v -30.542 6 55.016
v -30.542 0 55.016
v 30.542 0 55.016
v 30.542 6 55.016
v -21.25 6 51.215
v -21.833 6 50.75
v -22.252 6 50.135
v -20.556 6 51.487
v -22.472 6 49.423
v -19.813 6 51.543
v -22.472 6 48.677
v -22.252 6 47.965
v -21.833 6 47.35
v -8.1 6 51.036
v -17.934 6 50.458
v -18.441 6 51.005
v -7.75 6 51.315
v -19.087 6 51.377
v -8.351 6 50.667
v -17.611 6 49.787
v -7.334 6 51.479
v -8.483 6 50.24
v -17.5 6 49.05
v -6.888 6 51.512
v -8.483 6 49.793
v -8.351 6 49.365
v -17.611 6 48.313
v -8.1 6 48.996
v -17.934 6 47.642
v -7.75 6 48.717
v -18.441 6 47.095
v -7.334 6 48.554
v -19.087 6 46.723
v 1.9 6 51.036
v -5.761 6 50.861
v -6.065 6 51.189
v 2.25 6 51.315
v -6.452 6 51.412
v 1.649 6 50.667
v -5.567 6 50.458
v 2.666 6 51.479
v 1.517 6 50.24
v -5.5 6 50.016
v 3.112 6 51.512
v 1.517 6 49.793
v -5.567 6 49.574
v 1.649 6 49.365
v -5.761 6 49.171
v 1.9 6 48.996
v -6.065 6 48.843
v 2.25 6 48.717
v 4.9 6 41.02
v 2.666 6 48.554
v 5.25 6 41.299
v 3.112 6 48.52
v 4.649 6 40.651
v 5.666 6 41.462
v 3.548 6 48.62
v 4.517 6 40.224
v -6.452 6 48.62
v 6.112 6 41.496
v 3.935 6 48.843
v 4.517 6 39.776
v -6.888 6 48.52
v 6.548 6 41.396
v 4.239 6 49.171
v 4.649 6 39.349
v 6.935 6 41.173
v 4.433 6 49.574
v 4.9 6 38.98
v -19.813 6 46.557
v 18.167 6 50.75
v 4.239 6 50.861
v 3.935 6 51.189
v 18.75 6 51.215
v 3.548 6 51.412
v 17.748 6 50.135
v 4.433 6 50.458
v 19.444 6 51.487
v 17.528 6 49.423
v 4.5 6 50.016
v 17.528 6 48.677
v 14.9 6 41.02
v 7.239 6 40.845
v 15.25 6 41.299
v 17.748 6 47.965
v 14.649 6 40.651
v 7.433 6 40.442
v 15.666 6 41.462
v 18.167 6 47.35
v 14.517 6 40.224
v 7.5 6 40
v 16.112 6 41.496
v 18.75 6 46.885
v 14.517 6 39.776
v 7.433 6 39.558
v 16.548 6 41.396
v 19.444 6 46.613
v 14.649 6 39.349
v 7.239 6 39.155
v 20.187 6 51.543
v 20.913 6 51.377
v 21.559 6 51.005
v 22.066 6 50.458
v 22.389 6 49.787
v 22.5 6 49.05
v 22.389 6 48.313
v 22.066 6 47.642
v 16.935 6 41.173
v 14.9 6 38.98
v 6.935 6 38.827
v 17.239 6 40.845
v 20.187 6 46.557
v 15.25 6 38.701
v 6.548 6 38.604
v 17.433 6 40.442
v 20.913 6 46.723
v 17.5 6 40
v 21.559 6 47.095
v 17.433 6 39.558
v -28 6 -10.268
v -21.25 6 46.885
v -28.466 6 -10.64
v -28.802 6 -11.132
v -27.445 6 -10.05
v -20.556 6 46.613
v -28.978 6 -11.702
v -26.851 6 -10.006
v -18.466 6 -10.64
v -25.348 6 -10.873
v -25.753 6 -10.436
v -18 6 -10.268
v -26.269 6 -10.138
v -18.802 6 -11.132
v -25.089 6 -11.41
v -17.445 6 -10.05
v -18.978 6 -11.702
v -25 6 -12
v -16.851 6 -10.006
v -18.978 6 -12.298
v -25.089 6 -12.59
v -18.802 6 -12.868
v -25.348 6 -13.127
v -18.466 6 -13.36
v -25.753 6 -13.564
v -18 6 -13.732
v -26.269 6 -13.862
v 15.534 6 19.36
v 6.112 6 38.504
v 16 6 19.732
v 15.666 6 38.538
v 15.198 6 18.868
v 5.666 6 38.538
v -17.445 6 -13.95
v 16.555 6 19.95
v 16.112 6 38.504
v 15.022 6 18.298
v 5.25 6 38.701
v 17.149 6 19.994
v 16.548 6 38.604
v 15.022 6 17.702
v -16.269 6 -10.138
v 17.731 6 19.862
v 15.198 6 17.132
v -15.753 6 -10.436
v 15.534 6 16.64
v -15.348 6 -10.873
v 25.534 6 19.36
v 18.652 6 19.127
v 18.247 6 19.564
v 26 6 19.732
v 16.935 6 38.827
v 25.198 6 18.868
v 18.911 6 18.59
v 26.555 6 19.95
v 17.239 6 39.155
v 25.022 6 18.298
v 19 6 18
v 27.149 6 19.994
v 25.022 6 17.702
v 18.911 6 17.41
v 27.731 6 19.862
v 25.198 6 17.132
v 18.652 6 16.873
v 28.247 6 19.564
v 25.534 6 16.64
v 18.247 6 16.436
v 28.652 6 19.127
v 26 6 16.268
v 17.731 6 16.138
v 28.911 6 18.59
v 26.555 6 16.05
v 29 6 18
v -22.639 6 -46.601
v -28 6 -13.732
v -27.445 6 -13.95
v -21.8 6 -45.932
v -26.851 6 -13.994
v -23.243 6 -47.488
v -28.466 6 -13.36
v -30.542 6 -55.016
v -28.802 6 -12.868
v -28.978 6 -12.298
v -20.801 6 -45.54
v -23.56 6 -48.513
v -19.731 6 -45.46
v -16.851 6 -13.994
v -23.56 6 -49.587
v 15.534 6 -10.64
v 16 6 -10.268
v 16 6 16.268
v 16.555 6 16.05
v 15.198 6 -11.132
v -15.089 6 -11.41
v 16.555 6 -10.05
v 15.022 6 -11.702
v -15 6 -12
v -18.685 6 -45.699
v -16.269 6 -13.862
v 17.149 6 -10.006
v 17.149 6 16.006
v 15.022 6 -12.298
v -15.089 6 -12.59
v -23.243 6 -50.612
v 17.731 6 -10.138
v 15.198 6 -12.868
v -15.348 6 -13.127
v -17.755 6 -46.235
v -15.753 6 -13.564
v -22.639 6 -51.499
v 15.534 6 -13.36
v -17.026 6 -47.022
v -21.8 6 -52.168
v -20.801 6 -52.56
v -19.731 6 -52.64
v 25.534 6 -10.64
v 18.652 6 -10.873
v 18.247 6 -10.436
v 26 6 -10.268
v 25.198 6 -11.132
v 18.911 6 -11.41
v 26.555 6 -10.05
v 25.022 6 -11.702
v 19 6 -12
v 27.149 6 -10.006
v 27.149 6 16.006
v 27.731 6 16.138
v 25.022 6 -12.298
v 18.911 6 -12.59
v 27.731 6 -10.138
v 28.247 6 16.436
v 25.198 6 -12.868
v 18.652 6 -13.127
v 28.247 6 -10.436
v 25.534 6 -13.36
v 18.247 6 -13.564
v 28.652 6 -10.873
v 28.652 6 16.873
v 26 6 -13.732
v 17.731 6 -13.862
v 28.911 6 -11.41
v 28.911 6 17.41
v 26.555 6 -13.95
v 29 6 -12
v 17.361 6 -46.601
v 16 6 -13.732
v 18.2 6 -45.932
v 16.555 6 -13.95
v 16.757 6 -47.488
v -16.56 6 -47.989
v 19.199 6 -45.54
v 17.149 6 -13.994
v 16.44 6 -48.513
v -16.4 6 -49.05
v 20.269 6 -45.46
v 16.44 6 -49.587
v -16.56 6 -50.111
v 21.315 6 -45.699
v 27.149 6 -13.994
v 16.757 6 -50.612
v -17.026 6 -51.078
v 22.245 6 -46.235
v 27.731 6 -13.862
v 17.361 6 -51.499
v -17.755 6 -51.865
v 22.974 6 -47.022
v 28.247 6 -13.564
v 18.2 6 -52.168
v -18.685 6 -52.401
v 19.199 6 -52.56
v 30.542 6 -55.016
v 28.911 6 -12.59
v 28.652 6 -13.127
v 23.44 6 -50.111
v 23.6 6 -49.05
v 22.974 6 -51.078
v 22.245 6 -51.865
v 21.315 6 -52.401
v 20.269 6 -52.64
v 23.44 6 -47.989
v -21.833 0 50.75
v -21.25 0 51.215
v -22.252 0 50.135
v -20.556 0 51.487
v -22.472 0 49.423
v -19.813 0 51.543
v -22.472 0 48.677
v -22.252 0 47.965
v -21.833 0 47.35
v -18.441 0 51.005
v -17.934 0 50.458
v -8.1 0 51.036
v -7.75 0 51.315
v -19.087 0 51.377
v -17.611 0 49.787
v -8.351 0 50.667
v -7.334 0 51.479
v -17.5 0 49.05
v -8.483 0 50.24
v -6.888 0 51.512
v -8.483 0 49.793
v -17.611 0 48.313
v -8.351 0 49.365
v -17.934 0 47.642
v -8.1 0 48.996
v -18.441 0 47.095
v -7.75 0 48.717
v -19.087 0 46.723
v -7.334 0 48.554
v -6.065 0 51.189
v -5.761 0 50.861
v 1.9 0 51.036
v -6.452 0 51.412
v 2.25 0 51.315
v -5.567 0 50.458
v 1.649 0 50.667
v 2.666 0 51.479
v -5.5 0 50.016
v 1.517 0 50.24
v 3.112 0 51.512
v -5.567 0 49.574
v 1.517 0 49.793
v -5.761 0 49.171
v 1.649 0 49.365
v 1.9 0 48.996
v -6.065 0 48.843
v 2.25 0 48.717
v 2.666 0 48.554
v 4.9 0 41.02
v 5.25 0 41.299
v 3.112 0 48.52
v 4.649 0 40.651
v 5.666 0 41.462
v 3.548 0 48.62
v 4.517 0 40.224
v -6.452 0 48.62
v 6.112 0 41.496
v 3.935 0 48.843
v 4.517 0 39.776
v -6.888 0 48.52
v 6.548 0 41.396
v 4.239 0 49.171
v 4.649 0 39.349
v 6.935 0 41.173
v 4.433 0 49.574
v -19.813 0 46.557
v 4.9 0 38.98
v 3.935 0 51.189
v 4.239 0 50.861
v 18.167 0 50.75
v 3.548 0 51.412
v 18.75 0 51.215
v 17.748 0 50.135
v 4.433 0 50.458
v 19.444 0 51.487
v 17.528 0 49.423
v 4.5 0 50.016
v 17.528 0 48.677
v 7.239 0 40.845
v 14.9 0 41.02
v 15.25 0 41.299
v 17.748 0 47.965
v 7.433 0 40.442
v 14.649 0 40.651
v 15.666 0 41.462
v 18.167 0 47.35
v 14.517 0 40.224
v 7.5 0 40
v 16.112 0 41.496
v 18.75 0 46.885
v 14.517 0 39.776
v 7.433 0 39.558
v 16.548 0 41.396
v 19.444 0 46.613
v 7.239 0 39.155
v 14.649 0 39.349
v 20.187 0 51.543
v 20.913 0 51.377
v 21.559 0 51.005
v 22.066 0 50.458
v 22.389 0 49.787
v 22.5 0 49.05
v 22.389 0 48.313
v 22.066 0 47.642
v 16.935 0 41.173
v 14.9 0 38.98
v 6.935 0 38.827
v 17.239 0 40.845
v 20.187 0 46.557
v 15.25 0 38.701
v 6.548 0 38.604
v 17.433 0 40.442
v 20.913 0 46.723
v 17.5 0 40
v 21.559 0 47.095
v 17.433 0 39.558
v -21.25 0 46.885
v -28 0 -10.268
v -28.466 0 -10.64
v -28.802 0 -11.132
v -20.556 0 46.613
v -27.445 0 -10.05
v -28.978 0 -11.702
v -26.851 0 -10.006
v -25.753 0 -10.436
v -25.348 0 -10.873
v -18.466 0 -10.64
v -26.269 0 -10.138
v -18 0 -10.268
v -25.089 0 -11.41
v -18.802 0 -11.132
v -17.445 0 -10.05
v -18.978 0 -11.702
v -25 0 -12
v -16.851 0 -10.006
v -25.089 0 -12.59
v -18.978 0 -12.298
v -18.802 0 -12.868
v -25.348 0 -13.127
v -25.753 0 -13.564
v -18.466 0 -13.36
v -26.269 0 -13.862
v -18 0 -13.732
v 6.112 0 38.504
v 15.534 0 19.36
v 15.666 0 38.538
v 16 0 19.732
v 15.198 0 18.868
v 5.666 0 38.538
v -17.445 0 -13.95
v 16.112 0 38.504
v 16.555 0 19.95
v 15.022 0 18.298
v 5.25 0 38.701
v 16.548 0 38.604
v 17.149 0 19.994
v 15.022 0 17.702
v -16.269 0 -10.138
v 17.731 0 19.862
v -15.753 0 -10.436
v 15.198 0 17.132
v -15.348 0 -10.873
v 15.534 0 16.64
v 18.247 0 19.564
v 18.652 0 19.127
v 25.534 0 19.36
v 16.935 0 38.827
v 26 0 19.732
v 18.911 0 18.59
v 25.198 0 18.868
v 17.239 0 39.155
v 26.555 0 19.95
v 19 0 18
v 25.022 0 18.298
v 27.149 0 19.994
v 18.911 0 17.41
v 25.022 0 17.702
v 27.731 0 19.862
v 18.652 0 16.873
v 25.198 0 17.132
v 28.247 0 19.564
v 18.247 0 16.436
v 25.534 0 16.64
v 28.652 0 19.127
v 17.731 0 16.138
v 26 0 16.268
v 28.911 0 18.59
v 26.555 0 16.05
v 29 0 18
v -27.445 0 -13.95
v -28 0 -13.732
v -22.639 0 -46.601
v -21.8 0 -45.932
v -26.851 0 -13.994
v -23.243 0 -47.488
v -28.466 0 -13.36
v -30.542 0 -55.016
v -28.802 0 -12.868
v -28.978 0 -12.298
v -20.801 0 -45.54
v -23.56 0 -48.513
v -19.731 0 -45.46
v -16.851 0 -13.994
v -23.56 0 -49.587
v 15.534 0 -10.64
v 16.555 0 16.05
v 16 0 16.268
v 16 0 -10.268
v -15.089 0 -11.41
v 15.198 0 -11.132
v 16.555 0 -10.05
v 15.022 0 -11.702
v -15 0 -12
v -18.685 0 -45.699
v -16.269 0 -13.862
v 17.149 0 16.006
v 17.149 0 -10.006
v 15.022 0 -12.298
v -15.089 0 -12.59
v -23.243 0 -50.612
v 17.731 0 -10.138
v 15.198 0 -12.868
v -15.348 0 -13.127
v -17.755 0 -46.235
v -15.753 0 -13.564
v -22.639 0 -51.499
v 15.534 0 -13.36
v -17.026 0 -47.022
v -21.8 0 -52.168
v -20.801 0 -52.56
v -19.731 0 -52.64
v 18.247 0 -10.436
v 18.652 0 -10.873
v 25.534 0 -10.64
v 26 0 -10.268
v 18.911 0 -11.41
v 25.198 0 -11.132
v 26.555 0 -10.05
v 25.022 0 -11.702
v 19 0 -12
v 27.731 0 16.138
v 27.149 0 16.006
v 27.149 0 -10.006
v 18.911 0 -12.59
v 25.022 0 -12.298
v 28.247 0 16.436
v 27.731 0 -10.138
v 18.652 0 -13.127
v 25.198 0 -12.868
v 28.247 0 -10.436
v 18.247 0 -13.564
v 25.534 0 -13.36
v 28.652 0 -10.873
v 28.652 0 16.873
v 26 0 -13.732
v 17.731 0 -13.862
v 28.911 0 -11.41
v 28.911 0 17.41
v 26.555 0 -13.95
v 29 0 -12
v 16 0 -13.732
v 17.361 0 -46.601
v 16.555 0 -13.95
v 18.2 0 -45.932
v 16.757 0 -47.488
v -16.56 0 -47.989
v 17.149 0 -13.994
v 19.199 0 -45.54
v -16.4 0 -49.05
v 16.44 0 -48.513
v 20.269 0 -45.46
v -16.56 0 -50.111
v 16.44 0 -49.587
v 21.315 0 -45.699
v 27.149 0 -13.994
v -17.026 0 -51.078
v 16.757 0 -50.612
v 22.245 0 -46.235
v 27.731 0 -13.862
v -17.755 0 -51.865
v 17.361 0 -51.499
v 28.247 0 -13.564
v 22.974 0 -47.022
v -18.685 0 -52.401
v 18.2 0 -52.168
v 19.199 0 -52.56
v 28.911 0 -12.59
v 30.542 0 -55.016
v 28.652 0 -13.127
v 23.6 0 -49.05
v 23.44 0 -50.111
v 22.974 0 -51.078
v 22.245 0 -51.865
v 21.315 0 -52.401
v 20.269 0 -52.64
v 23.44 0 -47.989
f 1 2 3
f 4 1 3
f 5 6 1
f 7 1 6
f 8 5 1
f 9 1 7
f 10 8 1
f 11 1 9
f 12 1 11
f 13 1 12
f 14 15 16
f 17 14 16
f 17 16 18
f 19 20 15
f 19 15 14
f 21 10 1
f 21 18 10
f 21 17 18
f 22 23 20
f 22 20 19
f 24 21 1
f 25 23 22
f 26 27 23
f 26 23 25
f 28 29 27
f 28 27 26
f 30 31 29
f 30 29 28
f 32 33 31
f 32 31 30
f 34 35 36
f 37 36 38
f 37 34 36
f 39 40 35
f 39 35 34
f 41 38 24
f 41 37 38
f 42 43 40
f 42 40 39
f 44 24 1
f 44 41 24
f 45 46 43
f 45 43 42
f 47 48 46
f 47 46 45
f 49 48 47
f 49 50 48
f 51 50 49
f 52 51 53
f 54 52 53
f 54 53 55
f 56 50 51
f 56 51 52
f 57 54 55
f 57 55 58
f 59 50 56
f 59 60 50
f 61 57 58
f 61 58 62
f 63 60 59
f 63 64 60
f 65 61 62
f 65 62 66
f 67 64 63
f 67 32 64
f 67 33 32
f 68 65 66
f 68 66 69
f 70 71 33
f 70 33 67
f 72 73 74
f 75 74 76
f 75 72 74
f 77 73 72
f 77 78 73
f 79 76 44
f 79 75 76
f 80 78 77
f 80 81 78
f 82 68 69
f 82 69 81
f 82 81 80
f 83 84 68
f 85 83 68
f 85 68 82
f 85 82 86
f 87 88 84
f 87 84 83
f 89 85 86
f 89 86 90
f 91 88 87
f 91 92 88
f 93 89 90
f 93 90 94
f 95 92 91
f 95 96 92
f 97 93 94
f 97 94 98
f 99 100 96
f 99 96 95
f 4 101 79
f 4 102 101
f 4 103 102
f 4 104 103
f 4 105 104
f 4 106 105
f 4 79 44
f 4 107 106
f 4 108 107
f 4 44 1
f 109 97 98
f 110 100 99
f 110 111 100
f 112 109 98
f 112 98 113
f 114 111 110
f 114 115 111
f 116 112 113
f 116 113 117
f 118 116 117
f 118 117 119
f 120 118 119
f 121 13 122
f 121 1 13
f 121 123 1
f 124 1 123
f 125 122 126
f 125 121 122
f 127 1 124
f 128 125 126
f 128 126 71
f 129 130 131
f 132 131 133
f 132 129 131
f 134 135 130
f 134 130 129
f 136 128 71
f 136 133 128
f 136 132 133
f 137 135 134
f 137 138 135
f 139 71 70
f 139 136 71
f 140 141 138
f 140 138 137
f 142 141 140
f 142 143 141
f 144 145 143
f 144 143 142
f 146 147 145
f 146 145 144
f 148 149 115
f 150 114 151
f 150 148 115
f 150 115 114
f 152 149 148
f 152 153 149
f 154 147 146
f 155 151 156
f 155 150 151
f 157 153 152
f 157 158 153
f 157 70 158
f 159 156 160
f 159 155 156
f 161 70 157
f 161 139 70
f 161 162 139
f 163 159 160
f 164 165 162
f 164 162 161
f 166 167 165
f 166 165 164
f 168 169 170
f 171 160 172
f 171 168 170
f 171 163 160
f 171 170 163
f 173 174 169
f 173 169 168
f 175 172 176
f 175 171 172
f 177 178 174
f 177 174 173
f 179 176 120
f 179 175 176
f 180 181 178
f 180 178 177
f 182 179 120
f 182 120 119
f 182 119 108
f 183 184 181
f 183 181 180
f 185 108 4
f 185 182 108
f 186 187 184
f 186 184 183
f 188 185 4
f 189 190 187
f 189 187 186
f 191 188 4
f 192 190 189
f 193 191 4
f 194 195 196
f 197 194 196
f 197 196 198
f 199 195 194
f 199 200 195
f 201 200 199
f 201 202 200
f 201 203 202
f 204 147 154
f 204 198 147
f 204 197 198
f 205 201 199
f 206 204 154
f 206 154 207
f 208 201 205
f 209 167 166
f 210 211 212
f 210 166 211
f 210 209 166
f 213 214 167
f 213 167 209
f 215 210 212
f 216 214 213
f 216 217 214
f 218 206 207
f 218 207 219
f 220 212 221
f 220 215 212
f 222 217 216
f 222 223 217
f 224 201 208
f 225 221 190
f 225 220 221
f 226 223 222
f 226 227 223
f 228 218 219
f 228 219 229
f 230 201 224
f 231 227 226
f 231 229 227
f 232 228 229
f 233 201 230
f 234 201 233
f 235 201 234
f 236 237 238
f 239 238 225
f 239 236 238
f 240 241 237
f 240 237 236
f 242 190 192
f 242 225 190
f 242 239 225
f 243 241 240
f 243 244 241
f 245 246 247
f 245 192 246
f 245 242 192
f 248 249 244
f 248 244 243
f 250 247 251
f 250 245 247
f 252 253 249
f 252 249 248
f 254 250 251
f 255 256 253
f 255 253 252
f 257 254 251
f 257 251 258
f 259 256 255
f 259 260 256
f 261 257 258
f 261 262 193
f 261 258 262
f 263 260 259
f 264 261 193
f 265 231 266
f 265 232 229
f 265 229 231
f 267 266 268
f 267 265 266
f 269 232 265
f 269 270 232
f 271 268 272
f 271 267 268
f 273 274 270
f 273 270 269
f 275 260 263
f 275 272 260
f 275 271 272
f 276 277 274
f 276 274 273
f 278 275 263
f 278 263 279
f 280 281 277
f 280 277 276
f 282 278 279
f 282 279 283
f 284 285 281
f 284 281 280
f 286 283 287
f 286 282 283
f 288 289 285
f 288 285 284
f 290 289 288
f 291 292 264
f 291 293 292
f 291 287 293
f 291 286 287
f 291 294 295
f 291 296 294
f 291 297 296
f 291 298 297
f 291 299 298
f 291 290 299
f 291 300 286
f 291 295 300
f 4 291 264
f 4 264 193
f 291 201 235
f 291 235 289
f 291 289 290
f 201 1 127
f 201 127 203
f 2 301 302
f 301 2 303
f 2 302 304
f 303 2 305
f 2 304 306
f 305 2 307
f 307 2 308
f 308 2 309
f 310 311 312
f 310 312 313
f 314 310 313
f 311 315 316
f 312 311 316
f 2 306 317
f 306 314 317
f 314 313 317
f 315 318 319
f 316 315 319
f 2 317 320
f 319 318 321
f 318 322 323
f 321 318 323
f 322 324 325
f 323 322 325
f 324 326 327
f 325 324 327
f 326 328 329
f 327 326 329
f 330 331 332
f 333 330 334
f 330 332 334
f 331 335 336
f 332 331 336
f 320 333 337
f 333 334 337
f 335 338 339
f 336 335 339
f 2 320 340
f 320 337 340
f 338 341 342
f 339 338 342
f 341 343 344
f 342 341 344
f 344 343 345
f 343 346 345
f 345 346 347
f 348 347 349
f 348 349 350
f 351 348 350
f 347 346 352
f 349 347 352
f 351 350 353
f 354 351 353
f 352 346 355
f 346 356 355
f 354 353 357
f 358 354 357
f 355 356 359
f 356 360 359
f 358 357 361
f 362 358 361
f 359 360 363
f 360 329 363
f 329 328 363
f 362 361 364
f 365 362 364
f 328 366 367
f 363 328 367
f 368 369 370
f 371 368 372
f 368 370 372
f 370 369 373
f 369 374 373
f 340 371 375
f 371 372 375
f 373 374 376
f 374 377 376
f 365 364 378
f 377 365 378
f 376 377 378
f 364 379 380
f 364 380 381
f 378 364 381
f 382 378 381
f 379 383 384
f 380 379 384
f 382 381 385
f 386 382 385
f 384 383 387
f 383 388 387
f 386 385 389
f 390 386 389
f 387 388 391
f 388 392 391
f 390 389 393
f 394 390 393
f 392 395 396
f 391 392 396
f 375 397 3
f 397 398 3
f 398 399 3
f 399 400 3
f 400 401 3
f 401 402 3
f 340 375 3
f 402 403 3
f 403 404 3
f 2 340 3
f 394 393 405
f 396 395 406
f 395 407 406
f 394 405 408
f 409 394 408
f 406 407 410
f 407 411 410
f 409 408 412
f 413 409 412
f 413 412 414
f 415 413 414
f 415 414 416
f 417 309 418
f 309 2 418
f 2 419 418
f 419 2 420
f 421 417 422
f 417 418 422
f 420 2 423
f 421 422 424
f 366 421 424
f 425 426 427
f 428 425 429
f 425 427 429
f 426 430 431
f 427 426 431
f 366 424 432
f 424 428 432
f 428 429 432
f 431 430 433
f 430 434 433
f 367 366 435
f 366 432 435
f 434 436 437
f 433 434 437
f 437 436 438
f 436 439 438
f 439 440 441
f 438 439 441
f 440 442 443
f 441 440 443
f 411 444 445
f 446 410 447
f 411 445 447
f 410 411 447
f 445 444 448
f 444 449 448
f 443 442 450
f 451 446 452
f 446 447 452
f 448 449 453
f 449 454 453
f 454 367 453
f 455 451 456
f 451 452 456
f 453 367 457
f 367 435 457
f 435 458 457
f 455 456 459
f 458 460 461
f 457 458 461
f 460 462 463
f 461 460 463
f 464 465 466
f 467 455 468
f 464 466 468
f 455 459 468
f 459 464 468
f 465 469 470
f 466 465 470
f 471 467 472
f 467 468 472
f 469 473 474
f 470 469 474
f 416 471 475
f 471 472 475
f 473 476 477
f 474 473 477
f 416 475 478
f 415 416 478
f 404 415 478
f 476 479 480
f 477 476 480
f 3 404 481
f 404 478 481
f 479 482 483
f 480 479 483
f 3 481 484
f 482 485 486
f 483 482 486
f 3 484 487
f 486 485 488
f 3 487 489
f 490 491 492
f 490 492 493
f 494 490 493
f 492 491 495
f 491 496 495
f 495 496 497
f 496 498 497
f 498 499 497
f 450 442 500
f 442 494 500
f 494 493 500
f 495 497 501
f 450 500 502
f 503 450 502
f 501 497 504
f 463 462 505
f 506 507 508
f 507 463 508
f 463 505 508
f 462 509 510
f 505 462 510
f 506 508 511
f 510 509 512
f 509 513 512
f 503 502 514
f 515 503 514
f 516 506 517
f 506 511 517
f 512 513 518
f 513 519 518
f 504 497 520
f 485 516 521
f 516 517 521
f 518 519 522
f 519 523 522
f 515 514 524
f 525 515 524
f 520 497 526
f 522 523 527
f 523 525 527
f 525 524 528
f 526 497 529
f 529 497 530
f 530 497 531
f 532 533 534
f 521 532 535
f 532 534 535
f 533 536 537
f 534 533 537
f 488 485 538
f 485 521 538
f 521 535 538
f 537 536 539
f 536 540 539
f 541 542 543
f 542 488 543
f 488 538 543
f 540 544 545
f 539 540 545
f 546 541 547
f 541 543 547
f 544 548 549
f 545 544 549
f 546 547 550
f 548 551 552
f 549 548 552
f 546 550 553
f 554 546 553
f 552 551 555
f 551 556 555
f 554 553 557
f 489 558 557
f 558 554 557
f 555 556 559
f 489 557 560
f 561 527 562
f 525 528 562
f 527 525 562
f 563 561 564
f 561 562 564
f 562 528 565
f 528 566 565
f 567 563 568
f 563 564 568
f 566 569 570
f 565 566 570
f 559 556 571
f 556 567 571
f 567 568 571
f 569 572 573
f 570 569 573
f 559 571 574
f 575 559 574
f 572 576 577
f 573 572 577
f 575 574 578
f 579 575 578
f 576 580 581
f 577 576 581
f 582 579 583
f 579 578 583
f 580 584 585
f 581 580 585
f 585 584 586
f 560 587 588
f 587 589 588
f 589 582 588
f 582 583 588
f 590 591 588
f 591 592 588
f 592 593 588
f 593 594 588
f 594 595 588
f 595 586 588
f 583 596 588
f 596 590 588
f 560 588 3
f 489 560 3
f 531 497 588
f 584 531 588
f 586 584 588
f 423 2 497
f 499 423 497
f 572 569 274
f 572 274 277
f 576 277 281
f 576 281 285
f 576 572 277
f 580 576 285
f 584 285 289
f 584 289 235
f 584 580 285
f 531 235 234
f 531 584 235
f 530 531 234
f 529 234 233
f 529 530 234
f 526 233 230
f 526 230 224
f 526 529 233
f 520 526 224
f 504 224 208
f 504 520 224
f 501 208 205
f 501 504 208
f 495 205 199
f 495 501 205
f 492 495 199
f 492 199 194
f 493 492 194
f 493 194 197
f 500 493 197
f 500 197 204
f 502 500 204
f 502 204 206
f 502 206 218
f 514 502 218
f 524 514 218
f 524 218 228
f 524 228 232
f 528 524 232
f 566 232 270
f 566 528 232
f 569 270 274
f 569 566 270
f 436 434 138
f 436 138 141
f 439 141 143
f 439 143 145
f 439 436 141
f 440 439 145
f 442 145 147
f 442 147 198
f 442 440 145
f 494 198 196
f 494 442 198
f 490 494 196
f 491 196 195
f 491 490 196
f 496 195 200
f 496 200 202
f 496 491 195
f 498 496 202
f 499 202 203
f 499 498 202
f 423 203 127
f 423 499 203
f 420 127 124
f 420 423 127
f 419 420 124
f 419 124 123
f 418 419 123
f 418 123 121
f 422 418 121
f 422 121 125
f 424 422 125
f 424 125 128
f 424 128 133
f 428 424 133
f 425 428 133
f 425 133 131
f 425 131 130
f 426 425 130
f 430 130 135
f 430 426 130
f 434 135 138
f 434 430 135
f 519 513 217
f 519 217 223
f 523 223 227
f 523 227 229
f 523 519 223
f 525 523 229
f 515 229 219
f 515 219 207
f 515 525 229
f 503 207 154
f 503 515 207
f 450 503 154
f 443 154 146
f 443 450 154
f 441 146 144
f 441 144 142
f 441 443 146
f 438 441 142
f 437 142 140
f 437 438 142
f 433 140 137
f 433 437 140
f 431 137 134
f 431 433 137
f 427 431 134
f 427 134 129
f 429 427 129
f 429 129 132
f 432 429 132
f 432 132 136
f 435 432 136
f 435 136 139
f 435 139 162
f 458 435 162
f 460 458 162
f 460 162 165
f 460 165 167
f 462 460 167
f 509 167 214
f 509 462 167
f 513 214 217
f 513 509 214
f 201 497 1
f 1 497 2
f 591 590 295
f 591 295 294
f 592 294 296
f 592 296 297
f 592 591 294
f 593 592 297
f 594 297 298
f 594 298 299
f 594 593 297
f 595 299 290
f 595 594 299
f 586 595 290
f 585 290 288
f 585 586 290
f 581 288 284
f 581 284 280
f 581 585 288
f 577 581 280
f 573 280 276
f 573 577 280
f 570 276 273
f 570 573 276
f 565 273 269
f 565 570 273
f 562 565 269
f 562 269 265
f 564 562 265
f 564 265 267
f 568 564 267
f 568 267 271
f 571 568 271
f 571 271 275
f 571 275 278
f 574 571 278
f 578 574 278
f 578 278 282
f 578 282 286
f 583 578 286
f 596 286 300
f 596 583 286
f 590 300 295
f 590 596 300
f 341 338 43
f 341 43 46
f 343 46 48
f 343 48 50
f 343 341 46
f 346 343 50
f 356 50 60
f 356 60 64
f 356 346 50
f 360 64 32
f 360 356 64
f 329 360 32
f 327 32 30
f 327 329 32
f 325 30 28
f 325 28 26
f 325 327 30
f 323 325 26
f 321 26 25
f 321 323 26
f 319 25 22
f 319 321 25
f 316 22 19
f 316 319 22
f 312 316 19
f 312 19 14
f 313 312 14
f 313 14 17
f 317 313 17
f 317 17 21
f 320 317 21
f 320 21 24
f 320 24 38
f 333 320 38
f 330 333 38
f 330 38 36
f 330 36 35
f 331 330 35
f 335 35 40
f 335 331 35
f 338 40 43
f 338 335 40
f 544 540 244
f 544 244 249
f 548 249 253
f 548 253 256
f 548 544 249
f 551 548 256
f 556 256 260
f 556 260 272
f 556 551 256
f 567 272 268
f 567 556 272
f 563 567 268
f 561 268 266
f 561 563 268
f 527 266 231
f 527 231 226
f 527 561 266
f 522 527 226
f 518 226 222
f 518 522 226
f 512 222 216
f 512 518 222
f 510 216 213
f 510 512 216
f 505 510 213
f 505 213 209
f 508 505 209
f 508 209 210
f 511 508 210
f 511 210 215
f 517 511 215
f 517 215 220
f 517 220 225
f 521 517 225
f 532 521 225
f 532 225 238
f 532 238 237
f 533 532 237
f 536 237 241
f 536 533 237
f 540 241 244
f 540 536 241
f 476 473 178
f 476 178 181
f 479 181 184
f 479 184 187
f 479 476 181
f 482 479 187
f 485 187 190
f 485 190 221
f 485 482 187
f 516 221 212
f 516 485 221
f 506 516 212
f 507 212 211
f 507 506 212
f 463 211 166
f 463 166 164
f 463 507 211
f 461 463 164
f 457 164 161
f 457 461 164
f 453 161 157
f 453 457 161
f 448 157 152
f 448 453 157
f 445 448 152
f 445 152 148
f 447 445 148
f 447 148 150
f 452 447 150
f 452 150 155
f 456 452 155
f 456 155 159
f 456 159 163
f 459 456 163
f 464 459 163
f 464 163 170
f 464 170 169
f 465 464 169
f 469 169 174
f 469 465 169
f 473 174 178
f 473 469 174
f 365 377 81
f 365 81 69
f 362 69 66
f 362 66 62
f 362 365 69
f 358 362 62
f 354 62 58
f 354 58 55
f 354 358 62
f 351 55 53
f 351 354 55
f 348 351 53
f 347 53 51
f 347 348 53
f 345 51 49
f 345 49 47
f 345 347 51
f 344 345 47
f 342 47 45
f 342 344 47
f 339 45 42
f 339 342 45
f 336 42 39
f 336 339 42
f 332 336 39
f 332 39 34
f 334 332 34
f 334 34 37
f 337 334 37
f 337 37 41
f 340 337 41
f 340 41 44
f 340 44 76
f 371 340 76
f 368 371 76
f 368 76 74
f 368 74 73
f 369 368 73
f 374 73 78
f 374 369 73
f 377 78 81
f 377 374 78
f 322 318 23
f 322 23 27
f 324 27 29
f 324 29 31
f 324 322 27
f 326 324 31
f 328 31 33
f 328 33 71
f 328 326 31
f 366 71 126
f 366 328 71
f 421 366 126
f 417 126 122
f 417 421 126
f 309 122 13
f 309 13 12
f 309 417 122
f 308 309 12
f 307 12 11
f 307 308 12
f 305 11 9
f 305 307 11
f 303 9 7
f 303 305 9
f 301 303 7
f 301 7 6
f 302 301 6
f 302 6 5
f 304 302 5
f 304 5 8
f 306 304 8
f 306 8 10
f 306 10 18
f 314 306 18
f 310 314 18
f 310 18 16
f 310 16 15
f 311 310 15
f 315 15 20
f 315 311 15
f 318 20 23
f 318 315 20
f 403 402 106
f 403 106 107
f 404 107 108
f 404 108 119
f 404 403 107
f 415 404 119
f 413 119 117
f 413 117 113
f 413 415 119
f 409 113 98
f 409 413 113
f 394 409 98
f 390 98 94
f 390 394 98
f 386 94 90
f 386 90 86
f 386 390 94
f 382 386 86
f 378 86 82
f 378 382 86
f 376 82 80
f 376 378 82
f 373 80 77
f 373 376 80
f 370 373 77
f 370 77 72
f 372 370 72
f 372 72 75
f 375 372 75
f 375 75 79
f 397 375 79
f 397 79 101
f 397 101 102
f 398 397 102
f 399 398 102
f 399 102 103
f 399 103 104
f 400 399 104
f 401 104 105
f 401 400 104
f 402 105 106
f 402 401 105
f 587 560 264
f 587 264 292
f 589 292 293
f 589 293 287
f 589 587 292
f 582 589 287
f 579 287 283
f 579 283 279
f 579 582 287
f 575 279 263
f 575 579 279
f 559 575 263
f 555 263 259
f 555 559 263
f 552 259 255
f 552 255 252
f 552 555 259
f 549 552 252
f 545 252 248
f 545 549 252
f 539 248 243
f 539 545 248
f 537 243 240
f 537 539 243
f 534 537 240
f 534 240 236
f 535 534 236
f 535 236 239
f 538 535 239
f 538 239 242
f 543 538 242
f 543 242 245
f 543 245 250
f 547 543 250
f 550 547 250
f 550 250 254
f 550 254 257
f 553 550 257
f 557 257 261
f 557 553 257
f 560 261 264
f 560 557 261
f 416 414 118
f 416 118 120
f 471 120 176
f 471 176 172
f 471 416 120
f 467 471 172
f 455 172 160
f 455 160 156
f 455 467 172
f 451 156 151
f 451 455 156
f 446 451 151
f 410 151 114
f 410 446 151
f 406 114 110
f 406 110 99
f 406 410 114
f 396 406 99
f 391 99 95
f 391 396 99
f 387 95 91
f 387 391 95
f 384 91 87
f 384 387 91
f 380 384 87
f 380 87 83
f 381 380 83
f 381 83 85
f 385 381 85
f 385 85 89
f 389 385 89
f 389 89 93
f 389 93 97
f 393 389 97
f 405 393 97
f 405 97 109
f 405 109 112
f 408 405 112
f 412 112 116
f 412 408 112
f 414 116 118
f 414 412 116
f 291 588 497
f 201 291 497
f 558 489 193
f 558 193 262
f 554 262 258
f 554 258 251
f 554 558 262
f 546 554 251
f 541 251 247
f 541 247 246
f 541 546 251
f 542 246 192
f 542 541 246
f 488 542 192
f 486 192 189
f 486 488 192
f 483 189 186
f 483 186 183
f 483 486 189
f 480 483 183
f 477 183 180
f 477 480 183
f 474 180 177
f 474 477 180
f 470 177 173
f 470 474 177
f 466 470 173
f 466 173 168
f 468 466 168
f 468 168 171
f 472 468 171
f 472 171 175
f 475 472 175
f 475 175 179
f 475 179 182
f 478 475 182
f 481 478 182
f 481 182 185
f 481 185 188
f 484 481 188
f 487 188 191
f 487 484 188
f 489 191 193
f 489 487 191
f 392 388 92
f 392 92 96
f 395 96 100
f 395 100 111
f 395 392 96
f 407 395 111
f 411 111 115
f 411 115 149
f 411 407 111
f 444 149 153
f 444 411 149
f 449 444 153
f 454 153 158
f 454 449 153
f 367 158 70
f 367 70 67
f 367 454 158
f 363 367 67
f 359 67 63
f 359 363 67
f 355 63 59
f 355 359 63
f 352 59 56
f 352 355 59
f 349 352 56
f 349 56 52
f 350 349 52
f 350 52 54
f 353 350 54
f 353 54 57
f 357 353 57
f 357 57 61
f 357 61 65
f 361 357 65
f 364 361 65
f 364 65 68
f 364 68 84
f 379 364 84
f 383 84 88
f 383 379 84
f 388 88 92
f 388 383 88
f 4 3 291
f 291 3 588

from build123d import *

# Parameters (mm, degrees)
BOSS_EXTRUDE1_DEPTH = 6
SKETCH1_3_R         = 3.6
SKETCH1_3_R_2       = 2.5
SKETCH1_3_R_3       = 2
SKETCH1_3_R_4       = 1.5
CUT_EXTRUDE1_DEPTH  = 6


with BuildPart() as part:
    # Sketch1 → Boss-Extrude1 (new body)
    with BuildSketch(Plane(origin=(0, 0, 0), x_dir=(1, 0, 0), z_dir=(0, 1, 0))):
        Polygon((-30.541760722, -55.01618123), (30.541760722, -55.01618123), (30.541760722, 55.01618123), (-30.541760722, 55.01618123), (-30.541760722, 29.2), align=None)
    extrude(amount=BOSS_EXTRUDE1_DEPTH)

    # Sketch1<3> → Cut-Extrude1 (cut)
    with BuildSketch(Plane(origin=(0, 0, 0), x_dir=(1, 0, 0), z_dir=(0, 1, 0))):
        with Locations((-20, 49.05)):
            Circle(SKETCH1_3_R)
        with Locations((20, 49.05)):
            Circle(SKETCH1_3_R)
        with Locations((-20, -49.05)):
            Circle(SKETCH1_3_R_2)
        with Locations((20, -49.05)):
            Circle(SKETCH1_3_R_2)
        with Locations((17, 12)):
            Circle(SKETCH1_3_R_3)
        with Locations((27, 12)):
            Circle(SKETCH1_3_R_3)
        with Locations((27, -18)):
            Circle(SKETCH1_3_R_3)
        with Locations((17, -18)):
            Circle(SKETCH1_3_R_3)
        with Locations((-7, -50.01618123)):
            Circle(SKETCH1_3_R_4)
        with Locations((3, -50.01618123)):
            Circle(SKETCH1_3_R_4)
        with Locations((-27, 12)):
            Circle(SKETCH1_3_R_3)
        with Locations((-17, 12)):
            Circle(SKETCH1_3_R_3)
        with Locations((6, -40)):
            Circle(SKETCH1_3_R_4)
        with Locations((16, -40)):
            Circle(SKETCH1_3_R_4)
    extrude(amount=CUT_EXTRUDE1_DEPTH, mode=Mode.SUBTRACT)


solid = part.part
